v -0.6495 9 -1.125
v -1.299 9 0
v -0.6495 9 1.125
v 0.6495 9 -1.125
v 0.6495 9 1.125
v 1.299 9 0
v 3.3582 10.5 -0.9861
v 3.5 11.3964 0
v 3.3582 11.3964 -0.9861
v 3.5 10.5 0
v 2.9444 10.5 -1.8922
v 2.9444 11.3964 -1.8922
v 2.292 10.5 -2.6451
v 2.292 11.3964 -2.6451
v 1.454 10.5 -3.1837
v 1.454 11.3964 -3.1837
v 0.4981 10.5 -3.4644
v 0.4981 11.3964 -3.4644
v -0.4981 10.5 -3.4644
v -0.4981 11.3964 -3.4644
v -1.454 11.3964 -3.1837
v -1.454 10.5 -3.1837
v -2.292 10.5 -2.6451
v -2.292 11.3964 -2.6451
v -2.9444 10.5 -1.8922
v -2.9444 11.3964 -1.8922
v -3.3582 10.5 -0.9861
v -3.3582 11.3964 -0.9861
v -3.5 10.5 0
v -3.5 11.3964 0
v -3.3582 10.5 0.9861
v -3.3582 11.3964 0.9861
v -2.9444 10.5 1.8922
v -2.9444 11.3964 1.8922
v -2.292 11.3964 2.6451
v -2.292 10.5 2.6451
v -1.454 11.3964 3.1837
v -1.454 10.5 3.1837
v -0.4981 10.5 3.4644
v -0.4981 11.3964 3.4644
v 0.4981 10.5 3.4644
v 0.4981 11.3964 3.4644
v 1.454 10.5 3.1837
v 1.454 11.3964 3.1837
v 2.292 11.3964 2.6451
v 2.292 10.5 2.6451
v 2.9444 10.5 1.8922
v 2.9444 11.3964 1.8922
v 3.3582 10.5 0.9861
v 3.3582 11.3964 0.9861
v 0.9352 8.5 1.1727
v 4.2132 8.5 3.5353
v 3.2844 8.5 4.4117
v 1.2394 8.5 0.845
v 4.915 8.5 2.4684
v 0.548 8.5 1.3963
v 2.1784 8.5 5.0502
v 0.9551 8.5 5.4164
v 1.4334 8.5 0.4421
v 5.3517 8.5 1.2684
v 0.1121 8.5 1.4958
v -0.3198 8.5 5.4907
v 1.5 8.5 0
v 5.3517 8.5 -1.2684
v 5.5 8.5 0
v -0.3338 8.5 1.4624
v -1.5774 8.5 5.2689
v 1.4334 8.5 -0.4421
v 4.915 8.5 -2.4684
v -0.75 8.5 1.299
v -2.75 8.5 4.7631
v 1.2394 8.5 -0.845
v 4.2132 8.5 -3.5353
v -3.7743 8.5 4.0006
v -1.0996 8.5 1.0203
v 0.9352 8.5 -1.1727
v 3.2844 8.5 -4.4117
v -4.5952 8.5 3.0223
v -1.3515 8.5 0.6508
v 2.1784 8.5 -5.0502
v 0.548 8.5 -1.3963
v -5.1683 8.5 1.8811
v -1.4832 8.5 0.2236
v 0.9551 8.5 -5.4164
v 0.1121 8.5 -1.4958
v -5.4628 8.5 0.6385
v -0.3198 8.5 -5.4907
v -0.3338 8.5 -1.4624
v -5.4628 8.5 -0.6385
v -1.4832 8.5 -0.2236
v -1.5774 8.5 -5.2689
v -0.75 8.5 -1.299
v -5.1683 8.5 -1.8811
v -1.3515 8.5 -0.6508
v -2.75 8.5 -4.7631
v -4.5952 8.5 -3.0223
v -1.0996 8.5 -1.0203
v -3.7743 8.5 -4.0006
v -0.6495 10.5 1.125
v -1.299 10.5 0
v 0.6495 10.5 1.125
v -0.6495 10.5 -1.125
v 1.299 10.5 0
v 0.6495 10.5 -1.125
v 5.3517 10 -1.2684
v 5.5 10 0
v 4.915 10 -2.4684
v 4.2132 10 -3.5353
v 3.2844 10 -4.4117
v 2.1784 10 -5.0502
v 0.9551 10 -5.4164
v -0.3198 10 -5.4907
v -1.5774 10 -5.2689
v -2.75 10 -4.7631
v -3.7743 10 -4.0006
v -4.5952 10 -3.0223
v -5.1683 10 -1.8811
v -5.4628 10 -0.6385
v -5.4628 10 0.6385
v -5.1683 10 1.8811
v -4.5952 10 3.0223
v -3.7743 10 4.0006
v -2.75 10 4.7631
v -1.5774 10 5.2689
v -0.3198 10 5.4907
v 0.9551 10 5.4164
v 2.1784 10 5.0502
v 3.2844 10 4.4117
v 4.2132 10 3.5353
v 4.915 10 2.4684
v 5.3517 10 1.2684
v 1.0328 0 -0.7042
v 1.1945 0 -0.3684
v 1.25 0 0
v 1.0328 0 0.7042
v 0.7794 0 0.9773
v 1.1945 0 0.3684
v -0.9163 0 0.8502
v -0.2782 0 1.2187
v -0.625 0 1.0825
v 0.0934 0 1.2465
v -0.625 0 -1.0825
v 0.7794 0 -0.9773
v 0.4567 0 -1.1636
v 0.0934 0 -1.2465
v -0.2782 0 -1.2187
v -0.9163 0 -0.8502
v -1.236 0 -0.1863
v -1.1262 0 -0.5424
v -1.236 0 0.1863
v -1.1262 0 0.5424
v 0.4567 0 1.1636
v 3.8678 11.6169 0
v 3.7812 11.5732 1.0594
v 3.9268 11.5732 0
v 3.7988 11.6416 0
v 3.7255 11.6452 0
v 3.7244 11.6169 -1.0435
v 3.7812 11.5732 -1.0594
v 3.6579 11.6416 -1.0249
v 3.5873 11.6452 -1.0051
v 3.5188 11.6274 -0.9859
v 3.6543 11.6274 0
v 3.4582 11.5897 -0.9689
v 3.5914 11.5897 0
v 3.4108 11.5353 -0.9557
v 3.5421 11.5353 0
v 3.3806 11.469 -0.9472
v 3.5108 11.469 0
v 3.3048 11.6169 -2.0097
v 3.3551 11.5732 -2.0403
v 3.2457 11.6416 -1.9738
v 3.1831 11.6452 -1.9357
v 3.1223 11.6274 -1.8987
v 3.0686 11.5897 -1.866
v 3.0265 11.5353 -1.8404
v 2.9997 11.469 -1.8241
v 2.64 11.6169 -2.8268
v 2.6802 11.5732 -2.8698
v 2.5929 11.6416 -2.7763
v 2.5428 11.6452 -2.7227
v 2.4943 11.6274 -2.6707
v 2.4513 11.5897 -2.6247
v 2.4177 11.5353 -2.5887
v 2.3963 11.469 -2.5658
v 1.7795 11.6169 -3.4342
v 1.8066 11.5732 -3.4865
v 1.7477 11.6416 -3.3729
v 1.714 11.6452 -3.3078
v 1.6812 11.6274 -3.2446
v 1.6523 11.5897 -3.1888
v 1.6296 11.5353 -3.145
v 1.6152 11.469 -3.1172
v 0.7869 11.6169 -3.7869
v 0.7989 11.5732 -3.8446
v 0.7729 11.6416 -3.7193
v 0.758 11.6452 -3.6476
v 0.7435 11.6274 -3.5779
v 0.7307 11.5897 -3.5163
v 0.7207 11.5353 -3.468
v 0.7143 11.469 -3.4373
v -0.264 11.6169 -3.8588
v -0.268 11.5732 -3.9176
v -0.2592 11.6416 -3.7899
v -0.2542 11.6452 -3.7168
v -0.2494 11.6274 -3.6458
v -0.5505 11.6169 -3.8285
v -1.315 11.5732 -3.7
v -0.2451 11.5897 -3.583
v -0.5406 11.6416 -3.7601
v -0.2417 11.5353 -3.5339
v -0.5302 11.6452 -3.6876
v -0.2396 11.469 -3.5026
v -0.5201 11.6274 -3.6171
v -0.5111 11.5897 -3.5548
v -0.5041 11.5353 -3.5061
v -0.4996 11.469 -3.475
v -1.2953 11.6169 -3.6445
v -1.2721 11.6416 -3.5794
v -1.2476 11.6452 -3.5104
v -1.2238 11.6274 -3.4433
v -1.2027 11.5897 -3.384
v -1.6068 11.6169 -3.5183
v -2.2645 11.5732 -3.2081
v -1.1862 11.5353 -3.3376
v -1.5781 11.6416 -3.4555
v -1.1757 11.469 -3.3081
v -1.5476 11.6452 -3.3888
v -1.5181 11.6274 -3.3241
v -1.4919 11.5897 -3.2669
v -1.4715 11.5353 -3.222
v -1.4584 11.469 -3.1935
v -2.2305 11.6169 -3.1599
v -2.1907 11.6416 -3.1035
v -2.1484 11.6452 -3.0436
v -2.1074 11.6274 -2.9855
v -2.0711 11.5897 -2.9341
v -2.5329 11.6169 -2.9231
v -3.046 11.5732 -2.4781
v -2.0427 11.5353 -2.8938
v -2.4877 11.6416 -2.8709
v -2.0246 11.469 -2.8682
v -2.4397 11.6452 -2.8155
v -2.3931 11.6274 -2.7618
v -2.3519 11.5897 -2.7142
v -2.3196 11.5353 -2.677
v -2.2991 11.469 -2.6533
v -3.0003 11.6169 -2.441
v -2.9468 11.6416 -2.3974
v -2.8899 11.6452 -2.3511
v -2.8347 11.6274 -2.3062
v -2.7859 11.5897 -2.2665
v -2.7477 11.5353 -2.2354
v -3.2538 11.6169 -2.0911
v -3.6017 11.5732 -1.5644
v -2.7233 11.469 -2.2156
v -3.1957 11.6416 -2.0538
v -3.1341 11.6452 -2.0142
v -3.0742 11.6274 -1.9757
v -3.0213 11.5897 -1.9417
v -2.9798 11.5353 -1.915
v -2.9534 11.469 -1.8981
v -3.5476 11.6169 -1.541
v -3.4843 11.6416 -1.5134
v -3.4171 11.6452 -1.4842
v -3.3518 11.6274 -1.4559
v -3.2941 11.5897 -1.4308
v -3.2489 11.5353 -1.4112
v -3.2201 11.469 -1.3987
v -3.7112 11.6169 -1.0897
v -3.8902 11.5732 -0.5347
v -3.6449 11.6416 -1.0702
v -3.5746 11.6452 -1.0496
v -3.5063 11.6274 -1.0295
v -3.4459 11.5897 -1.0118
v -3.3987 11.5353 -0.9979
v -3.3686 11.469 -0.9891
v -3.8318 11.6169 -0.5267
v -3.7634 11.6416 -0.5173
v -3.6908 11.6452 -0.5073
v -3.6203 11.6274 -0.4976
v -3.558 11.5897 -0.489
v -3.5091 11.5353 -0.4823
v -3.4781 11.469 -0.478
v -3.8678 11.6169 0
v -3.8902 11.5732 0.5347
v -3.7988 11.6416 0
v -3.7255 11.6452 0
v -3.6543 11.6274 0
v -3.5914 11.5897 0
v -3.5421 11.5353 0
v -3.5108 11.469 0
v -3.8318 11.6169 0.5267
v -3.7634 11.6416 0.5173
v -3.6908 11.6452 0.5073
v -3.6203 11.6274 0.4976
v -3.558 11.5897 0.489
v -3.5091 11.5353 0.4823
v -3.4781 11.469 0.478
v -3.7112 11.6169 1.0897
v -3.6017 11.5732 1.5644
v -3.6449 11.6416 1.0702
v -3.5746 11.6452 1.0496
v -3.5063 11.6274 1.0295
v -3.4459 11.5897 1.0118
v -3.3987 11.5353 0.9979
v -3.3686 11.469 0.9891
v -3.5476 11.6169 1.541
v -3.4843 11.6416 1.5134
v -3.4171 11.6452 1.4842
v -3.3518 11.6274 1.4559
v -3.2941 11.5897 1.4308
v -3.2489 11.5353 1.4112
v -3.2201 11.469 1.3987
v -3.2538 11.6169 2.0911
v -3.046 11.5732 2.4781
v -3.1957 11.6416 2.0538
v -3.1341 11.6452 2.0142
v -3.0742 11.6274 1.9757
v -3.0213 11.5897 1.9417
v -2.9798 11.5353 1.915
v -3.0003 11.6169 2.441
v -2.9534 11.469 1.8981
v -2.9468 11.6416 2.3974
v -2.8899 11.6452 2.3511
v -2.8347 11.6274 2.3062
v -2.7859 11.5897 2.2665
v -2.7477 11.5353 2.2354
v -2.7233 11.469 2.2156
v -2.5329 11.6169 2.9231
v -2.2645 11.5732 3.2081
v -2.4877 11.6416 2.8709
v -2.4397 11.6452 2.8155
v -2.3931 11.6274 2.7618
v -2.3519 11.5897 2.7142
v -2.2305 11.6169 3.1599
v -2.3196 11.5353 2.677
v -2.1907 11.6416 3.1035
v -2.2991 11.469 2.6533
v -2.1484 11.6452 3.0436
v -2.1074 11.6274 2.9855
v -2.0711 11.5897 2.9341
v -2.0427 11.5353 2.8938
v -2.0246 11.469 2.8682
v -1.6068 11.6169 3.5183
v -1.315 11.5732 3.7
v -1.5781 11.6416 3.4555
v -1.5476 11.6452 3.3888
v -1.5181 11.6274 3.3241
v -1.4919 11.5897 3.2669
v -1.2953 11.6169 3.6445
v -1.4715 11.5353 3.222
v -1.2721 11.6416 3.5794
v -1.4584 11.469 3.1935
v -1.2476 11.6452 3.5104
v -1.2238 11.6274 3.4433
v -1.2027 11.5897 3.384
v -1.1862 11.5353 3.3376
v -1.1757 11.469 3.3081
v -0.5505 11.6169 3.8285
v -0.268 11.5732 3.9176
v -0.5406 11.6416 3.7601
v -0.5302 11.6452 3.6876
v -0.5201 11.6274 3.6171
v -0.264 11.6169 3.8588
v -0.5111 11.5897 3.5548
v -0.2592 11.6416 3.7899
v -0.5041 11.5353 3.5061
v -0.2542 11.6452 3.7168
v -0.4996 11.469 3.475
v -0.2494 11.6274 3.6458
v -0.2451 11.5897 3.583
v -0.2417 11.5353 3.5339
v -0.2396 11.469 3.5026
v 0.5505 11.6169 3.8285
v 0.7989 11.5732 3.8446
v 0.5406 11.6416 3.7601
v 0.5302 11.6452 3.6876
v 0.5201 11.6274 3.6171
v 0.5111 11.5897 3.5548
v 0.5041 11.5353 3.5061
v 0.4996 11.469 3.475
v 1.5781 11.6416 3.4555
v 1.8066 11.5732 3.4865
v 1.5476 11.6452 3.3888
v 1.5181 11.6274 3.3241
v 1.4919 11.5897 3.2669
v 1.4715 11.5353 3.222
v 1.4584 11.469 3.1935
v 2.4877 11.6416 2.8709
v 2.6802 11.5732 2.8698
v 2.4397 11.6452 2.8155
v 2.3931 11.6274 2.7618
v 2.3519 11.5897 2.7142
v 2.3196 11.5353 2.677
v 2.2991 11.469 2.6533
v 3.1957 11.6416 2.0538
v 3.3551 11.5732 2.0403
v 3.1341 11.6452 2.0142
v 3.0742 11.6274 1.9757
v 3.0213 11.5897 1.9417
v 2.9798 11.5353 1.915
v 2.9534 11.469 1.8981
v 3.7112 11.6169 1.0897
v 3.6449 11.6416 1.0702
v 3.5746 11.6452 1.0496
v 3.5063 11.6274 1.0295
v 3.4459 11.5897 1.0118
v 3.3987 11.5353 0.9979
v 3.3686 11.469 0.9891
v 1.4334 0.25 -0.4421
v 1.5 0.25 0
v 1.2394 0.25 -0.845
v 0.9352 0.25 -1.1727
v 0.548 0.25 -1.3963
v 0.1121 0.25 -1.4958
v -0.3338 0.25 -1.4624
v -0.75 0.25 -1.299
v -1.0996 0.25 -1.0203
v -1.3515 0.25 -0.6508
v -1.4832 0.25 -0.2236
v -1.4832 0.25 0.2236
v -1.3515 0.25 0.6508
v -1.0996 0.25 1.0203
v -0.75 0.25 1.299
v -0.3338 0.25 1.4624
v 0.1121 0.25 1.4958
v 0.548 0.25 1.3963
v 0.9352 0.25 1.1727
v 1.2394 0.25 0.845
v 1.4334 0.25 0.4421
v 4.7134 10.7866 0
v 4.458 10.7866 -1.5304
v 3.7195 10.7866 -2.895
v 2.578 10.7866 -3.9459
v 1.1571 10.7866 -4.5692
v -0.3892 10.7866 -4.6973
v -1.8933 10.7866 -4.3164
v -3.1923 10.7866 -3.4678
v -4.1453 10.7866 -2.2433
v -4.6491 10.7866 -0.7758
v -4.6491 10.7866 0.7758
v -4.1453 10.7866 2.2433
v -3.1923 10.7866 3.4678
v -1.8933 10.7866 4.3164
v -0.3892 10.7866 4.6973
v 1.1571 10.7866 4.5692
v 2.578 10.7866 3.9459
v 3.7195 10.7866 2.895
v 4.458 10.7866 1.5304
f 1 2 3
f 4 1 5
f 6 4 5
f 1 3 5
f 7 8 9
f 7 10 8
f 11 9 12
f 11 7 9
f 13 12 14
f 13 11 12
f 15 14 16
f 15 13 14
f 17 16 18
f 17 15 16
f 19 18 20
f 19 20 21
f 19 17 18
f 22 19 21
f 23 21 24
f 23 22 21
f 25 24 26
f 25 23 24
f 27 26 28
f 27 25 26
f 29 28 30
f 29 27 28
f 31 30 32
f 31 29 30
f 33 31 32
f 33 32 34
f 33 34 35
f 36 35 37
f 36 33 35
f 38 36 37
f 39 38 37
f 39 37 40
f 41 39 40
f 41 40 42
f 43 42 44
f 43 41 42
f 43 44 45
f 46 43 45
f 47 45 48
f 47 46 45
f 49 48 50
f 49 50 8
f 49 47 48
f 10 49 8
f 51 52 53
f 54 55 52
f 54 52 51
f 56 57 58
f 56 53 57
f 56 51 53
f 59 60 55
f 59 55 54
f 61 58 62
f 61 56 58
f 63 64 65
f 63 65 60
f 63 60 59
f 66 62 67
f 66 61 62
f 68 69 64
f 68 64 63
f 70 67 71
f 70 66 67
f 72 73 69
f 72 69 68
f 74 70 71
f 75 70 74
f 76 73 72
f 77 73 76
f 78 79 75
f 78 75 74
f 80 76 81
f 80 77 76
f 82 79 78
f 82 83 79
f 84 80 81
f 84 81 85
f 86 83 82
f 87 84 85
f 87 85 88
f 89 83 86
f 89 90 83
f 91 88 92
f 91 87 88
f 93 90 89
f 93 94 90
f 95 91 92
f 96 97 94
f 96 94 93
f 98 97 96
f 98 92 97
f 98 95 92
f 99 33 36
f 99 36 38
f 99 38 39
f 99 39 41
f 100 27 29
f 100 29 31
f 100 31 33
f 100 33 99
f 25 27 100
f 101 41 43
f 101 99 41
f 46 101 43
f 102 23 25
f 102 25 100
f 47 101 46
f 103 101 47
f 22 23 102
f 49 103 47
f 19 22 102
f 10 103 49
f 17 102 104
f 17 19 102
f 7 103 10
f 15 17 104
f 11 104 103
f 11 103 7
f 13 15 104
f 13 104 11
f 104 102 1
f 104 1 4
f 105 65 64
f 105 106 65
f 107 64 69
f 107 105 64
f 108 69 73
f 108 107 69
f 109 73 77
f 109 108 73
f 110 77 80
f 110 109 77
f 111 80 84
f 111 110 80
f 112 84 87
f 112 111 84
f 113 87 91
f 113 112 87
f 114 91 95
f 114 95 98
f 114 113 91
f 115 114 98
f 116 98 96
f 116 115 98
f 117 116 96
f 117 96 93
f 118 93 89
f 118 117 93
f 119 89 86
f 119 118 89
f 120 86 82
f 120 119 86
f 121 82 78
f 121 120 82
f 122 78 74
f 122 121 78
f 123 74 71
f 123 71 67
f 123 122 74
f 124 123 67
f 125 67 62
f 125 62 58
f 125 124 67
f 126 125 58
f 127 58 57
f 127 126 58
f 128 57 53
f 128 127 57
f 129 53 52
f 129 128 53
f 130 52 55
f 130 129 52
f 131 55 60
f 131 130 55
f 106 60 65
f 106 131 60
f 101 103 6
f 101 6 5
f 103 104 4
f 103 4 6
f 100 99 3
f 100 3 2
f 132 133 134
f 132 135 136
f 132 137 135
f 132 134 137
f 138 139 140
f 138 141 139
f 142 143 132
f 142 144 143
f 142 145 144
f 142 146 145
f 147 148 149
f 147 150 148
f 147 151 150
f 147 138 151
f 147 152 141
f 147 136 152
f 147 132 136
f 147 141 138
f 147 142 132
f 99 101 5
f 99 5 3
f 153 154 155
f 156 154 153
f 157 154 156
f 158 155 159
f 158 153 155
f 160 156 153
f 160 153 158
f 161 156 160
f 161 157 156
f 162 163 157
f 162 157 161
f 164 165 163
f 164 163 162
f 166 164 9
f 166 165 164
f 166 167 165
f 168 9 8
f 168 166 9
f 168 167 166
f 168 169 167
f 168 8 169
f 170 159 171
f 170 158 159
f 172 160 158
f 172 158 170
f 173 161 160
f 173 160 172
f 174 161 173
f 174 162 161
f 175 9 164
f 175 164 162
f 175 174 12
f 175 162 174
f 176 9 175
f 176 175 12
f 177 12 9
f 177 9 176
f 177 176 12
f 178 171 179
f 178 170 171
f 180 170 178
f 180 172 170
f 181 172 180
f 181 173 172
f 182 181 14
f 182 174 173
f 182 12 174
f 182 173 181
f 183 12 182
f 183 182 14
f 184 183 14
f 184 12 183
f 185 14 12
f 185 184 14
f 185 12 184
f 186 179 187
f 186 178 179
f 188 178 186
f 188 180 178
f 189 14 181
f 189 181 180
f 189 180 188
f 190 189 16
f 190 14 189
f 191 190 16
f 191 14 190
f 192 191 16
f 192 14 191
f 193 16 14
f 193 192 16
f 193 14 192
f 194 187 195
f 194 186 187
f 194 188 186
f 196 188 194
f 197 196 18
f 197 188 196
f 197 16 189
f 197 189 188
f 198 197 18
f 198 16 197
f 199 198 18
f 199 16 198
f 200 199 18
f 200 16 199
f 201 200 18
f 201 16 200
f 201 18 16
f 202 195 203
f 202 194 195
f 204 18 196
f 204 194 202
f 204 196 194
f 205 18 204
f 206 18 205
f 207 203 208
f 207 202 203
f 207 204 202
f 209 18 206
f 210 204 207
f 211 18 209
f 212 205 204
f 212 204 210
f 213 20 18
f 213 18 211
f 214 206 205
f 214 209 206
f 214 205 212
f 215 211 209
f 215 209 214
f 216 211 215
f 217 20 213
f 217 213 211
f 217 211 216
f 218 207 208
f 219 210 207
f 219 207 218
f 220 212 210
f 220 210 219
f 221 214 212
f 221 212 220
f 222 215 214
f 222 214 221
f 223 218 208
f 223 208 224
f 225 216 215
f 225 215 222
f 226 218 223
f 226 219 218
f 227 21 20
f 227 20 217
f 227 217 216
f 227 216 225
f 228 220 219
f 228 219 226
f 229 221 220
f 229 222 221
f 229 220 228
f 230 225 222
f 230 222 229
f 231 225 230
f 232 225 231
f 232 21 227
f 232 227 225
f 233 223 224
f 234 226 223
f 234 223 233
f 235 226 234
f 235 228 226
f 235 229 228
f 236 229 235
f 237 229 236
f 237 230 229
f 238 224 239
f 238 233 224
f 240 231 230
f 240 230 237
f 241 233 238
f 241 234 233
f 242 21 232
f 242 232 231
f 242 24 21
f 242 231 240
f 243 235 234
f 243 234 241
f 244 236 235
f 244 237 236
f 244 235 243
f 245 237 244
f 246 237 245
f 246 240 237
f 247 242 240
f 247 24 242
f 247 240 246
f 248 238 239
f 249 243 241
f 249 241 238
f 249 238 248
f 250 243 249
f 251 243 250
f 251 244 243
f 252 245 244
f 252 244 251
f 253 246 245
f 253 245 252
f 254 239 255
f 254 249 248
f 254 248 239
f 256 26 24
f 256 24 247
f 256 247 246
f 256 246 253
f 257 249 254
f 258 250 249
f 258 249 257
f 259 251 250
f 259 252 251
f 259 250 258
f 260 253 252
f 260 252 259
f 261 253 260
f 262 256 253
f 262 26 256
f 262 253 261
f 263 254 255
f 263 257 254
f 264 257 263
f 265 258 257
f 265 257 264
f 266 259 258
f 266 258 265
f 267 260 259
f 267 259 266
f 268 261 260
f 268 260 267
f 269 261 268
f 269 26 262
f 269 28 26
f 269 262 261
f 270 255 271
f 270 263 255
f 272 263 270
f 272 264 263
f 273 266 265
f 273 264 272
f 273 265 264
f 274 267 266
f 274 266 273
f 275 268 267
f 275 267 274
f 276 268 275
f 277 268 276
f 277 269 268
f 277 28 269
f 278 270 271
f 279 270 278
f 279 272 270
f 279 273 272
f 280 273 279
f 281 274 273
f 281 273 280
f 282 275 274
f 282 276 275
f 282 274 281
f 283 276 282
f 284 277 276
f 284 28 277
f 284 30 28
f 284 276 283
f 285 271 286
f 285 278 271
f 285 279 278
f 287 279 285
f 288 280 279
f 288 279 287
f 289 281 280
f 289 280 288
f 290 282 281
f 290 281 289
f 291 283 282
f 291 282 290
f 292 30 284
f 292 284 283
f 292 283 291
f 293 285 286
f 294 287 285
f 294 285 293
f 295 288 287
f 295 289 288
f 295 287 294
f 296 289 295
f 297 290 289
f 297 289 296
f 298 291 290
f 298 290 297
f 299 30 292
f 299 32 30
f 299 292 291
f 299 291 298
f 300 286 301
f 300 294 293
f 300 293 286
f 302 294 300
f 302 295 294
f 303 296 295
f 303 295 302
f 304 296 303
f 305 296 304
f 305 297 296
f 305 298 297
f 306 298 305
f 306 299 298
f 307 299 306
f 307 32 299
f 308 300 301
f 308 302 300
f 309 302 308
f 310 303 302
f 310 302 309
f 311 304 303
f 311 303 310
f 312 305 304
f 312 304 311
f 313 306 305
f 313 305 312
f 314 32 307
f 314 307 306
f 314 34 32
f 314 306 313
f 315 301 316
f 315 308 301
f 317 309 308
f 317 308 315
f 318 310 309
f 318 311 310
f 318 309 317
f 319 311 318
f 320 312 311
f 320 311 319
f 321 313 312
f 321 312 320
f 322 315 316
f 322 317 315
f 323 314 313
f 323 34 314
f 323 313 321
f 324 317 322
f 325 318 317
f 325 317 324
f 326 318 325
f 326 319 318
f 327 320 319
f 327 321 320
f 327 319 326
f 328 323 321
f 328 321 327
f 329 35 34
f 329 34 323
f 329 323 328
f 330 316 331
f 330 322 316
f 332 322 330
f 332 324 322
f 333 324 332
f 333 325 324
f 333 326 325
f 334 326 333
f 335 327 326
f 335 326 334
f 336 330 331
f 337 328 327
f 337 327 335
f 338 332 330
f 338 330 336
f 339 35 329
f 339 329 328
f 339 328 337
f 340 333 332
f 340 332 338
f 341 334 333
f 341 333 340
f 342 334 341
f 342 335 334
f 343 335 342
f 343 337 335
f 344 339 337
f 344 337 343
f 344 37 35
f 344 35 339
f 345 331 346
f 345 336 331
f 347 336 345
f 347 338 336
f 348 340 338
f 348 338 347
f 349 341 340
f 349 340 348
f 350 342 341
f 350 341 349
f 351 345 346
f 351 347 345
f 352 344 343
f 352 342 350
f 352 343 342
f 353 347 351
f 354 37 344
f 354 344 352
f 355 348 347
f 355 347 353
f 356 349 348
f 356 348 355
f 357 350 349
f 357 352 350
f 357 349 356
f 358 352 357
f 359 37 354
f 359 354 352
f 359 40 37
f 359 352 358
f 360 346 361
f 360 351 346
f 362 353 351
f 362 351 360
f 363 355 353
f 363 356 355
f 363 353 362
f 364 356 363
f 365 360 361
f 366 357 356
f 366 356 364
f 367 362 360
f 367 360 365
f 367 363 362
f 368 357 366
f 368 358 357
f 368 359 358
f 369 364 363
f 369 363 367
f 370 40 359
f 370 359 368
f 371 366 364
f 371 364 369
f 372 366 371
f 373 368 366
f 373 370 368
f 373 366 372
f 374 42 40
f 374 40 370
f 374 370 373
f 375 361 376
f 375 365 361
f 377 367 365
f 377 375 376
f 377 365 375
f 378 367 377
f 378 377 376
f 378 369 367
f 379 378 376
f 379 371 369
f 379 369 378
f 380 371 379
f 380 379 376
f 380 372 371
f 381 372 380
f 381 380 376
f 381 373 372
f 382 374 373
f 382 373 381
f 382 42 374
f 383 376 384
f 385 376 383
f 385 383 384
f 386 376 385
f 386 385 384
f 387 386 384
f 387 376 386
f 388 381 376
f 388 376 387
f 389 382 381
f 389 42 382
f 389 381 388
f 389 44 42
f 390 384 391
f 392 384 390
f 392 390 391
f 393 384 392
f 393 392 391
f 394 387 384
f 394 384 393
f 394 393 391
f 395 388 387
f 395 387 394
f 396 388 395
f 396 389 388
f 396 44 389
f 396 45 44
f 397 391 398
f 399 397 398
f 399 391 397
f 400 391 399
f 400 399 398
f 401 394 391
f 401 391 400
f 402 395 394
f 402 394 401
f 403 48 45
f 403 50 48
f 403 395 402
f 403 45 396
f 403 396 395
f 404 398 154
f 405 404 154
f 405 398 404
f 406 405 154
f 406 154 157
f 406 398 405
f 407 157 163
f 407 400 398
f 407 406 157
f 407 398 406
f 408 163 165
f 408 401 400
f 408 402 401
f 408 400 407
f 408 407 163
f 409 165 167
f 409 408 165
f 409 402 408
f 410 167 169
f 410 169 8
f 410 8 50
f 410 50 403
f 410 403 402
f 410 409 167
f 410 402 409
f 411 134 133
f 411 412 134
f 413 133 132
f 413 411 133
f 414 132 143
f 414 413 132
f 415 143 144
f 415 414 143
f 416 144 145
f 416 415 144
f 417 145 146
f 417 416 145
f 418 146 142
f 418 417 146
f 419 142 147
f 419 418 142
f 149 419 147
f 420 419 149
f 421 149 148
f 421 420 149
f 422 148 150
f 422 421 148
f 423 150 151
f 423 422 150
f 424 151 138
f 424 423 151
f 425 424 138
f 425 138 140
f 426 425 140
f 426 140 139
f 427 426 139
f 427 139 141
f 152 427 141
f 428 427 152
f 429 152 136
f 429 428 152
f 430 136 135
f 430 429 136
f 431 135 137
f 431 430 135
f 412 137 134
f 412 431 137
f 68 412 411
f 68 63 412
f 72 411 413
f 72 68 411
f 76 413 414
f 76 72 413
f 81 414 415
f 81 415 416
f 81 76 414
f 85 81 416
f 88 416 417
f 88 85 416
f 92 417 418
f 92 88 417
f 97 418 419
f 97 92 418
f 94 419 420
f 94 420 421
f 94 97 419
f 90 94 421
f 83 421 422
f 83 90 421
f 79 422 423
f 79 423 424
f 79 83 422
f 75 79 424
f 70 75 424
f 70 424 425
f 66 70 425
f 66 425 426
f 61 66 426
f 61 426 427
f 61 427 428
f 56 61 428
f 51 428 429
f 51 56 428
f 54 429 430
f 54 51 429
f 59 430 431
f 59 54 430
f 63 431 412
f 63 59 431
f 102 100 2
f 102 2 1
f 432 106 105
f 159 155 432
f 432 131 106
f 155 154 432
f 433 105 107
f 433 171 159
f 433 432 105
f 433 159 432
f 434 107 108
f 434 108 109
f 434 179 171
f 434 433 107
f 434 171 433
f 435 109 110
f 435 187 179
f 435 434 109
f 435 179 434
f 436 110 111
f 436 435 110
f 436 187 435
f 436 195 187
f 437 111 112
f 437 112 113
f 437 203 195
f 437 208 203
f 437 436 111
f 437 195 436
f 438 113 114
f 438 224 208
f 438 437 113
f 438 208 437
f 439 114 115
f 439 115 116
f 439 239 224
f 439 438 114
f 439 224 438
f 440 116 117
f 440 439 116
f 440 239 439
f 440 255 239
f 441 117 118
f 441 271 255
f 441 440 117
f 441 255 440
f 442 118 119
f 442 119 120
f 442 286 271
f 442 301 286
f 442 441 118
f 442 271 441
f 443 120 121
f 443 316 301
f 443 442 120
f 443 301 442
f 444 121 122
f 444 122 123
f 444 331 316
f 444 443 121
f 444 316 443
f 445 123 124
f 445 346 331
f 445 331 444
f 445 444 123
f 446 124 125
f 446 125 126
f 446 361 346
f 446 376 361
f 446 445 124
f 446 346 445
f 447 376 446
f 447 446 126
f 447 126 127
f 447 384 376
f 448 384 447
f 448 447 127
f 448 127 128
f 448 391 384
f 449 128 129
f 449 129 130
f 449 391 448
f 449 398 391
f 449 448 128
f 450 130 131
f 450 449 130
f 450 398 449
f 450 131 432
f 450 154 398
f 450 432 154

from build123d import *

# Parameters (mm, degrees)
ENL_V_MAT_EXTRU_1_DEPTH = 1.5


with BuildPart() as part:
    # Esquisse1 → Base-Révolution (revolve)
    with BuildSketch(Plane.XY):
        with BuildLine():
            Line((0, 0), (1.25, 0))
            Line((1.25, 0), (1.5, 0.25))
            Line((1.5, 0.25), (1.5, 8.5))
            Line((1.5, 8.5), (5.5, 8.5))
            Line((5.5, 8.5), (5.5, 10))
            Line((5.5, 10), (3.926776695, 11.573223305))
            ThreePointArc((3.926776695, 11.573223305), (3.654329142, 11.627416493), (3.5, 11.396446609))
            Line((3.5, 11.396446609), (3.5, 10.5))
            Line((3.5, 10.5), (0, 10.5))
            Line((0, 10.5), (0, 0))
        make_face()
    revolve(axis=Axis((0, -3.120322121, 0), (0, 1, 0)))

    # Esquisse2 → Enlèv. mat.-Extru.1 (cut)
    with BuildSketch(Plane(origin=(0, 10.5, 0), x_dir=(-1, 0, 0), z_dir=(0, 1, 0))):
        Polygon((-0.649519053, 1.125), (0.649519053, 1.125), (1.299038106, 0), (0.649519053, -1.125), (-0.649519053, -1.125), (-1.299038106, 0), align=None)
    extrude(amount=-ENL_V_MAT_EXTRU_1_DEPTH, mode=Mode.SUBTRACT)


solid = part.part
